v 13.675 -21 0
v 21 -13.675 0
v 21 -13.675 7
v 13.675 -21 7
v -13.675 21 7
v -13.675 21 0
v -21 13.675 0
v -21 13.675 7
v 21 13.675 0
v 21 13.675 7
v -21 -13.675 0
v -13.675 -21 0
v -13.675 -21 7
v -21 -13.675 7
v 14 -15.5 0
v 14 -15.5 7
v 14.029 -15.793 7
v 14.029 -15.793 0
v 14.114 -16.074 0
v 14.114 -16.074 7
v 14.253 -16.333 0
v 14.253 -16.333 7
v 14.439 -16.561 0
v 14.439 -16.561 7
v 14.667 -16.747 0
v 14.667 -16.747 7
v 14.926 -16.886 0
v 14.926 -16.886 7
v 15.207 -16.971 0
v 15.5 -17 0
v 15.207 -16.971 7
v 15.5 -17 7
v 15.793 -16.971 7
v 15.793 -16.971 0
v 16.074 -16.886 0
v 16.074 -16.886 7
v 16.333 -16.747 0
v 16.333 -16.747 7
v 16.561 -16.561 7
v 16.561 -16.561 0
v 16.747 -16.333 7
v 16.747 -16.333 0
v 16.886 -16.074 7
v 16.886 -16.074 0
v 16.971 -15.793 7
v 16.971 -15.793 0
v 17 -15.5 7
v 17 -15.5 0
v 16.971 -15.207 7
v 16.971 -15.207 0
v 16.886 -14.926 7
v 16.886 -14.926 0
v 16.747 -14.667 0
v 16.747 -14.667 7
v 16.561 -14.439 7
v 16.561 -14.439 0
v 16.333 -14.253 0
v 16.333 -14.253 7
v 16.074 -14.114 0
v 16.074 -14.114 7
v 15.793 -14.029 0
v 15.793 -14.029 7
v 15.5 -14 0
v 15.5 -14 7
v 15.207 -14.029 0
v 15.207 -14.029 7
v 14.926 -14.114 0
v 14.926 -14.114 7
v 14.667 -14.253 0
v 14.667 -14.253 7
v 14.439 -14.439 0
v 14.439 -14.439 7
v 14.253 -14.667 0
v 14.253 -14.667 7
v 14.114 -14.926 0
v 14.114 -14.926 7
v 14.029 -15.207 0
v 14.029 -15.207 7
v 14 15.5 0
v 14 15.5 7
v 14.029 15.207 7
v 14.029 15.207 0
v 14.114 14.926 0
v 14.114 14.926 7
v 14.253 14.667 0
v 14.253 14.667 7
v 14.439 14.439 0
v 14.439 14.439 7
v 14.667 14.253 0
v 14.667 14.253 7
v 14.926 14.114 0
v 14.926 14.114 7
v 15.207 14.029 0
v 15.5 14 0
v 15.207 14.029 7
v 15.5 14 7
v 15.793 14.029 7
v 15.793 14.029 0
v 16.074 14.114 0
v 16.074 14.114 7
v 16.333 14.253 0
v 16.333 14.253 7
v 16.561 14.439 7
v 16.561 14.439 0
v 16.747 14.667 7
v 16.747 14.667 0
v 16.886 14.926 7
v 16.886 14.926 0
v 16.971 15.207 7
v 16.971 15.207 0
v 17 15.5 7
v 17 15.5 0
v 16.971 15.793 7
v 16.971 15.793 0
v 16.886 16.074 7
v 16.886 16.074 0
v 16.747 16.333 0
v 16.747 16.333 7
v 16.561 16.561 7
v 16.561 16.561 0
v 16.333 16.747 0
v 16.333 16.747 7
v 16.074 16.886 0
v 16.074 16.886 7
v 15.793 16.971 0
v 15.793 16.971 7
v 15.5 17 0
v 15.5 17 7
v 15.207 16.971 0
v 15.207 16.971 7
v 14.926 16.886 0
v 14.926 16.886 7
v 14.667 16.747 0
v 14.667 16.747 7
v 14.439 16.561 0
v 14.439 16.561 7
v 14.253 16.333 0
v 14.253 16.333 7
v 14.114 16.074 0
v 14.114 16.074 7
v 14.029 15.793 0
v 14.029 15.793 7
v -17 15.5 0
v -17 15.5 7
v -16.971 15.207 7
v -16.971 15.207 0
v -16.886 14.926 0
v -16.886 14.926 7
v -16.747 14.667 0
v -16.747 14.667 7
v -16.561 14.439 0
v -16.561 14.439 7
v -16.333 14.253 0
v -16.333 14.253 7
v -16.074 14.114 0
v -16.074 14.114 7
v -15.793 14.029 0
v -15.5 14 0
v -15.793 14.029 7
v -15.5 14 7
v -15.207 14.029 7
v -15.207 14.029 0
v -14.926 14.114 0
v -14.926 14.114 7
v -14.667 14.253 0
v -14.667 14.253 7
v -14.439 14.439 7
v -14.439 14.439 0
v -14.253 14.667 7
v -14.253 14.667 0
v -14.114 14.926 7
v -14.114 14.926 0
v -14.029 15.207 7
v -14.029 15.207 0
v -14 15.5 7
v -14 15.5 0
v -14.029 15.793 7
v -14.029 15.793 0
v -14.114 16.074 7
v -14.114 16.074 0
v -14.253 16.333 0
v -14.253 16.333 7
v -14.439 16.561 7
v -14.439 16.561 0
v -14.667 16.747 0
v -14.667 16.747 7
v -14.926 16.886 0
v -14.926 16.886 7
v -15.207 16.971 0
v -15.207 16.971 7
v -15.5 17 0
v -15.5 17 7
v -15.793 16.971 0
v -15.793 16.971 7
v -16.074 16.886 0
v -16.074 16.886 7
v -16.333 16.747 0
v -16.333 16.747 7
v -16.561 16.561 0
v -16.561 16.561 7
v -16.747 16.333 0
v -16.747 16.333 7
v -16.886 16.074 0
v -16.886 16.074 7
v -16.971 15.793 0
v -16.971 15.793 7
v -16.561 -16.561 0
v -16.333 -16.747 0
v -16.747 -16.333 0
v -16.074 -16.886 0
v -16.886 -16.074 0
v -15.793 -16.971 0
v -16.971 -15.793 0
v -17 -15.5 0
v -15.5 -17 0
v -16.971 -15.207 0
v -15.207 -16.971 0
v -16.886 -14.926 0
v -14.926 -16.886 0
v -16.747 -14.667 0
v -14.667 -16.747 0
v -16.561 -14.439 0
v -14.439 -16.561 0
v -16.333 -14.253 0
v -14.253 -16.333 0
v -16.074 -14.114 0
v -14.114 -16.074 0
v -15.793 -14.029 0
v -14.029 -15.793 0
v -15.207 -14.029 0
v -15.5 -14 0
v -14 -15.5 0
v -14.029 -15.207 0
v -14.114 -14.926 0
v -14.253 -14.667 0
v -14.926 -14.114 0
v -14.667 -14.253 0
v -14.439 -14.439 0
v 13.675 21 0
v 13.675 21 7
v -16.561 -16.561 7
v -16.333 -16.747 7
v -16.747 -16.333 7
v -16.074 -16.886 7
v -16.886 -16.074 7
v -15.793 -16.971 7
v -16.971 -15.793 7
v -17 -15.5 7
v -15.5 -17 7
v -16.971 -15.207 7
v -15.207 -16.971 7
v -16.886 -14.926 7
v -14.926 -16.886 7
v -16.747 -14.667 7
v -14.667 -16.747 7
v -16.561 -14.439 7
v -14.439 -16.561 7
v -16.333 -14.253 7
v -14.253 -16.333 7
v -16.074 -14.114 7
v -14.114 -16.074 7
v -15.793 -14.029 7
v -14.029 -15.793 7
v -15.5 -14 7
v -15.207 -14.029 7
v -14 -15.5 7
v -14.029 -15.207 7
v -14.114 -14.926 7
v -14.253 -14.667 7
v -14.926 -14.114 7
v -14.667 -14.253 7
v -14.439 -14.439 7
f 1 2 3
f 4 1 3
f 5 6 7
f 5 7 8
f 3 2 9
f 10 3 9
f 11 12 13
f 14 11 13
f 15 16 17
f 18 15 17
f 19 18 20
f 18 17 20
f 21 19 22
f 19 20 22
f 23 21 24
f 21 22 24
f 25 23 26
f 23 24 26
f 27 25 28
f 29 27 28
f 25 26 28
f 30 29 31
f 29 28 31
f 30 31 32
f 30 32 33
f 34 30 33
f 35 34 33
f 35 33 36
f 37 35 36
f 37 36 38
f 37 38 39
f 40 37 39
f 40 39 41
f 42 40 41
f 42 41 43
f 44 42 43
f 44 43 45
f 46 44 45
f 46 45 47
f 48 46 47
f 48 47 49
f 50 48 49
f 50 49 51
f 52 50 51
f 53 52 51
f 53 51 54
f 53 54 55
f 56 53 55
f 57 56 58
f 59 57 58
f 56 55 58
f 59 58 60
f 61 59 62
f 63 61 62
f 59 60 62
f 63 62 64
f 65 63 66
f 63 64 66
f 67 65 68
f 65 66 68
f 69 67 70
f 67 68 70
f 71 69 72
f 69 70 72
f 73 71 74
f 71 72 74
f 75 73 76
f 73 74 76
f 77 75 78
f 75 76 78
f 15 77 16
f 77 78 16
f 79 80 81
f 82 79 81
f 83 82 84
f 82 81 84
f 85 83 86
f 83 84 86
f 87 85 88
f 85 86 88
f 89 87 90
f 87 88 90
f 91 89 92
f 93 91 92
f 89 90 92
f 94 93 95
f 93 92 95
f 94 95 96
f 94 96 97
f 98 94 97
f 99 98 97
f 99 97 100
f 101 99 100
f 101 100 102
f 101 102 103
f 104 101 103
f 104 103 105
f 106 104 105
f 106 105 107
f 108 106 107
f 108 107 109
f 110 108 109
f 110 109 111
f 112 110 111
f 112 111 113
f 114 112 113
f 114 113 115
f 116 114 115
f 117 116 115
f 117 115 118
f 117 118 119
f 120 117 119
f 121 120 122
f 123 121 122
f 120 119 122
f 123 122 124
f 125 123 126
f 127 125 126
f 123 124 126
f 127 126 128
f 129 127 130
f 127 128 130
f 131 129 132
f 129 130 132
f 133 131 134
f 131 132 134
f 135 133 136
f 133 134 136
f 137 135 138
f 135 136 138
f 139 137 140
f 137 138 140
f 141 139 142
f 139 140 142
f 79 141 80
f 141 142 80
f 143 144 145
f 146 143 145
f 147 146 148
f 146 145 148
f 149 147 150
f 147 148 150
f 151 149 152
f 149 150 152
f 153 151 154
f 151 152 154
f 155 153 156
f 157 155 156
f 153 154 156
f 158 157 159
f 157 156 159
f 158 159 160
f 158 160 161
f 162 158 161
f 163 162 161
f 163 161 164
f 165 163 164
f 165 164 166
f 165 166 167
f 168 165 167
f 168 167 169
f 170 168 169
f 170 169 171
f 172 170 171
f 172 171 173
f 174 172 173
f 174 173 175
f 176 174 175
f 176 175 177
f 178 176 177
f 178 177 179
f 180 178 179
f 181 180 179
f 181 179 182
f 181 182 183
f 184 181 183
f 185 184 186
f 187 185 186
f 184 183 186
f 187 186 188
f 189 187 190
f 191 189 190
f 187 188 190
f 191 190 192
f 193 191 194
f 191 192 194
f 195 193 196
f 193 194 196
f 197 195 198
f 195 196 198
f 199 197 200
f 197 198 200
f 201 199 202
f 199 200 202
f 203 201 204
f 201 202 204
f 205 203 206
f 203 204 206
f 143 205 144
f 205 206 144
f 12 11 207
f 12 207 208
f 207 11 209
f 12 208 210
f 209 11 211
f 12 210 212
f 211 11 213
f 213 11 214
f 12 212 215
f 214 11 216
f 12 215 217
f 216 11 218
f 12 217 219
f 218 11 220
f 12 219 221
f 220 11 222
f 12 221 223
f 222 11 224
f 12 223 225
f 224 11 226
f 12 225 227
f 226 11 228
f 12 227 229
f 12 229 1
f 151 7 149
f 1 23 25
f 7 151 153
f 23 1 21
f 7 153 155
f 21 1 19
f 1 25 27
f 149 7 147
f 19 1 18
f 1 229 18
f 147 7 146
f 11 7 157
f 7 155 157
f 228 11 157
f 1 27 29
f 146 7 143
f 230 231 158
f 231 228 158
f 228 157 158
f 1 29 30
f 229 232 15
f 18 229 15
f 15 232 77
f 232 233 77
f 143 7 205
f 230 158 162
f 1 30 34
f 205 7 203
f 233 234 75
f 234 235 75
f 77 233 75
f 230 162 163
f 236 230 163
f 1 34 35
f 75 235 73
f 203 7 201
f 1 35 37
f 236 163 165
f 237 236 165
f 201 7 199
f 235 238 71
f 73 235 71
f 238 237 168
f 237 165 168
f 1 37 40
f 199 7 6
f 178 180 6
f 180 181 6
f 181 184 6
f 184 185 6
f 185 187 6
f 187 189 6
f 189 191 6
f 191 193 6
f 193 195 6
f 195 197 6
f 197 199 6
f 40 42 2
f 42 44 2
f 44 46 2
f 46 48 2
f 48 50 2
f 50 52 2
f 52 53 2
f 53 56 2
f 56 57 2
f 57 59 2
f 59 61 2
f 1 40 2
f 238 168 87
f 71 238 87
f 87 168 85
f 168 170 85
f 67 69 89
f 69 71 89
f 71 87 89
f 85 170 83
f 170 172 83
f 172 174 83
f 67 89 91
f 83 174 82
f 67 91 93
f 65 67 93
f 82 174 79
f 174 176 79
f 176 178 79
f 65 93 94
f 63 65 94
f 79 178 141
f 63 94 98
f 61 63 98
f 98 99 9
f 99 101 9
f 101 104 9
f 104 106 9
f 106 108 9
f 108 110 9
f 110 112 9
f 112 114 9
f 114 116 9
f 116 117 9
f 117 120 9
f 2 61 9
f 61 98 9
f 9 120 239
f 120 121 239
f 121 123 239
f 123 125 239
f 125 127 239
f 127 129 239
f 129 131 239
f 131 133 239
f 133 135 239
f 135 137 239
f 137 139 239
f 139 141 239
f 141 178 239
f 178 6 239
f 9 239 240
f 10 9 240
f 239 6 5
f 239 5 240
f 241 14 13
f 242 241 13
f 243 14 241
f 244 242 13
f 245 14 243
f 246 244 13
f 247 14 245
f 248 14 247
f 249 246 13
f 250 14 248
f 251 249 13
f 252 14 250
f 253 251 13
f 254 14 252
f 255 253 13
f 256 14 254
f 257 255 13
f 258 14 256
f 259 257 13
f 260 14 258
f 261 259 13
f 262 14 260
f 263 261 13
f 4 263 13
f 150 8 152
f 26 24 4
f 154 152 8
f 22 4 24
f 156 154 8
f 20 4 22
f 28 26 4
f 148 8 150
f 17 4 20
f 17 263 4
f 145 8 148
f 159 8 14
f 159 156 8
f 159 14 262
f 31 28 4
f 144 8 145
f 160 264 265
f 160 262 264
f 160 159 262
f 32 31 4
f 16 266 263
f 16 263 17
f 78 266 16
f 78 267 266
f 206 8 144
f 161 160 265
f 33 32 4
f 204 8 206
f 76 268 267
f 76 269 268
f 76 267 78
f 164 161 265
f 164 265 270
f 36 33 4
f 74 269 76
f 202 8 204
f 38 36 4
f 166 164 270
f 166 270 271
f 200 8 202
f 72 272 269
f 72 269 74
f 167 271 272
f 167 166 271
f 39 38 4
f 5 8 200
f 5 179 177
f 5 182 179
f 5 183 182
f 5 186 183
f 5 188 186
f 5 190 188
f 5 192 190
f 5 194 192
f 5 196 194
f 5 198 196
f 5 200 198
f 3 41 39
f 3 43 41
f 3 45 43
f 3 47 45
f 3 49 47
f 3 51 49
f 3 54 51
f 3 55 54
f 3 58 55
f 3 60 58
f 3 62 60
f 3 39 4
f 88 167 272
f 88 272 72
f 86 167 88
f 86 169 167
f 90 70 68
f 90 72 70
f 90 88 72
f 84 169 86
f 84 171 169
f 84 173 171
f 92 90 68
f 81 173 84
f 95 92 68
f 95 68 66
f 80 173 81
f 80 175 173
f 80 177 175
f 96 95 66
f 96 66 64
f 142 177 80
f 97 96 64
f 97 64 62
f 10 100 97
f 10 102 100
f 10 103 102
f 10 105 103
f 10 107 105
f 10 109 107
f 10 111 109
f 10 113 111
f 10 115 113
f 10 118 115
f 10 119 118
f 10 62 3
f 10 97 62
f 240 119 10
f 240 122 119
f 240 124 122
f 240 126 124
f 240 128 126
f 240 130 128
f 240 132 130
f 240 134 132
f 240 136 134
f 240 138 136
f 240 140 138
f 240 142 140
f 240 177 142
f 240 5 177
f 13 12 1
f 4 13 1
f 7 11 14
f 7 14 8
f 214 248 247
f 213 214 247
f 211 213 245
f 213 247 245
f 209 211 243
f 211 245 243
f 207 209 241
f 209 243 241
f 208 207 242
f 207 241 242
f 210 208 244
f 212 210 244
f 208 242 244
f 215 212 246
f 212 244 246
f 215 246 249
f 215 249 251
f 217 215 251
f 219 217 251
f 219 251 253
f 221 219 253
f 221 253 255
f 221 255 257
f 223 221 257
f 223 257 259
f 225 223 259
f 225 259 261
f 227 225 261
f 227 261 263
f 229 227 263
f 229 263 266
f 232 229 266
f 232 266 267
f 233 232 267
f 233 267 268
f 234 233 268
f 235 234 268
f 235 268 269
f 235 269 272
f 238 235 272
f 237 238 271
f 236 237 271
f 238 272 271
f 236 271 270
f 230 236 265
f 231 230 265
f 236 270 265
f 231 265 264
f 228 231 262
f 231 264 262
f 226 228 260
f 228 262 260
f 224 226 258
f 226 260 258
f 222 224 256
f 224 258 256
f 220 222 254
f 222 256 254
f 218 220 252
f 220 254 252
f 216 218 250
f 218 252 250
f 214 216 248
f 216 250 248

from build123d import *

# Parameters (mm, degrees)
F0_W     = 42
F0_H     = 42
F1_DEPTH = 7
F2_SIZE  = 7.325
F3_D     = 3


with BuildPart() as f1:
    # F0 (on Top) → F1 (new body)
    with BuildSketch(Plane.XY):
        Rectangle(F0_W, F0_H)
    extrude(amount=F1_DEPTH)

    # F2
    f2_edges = [f1.edges().sort_by_distance(p)[0] for p in [
        (-21, -21, 3.5),
        (21, -21, 3.5),
        (21, 21, 3.5),
        (-21, 21, 3.5),
    ]]
    chamfer(f2_edges, length=F2_SIZE)

    # F3 (through all)
    with Locations(Plane(origin=(0, 0, 0), x_dir=(1, 0, 0), z_dir=(0, 0, -1))):
        with Locations((15.5, 15.5), (-15.5, 15.5), (-15.5, -15.5), (15.5, -15.5)):
            Hole(F3_D / 2)


solid = f1.part
